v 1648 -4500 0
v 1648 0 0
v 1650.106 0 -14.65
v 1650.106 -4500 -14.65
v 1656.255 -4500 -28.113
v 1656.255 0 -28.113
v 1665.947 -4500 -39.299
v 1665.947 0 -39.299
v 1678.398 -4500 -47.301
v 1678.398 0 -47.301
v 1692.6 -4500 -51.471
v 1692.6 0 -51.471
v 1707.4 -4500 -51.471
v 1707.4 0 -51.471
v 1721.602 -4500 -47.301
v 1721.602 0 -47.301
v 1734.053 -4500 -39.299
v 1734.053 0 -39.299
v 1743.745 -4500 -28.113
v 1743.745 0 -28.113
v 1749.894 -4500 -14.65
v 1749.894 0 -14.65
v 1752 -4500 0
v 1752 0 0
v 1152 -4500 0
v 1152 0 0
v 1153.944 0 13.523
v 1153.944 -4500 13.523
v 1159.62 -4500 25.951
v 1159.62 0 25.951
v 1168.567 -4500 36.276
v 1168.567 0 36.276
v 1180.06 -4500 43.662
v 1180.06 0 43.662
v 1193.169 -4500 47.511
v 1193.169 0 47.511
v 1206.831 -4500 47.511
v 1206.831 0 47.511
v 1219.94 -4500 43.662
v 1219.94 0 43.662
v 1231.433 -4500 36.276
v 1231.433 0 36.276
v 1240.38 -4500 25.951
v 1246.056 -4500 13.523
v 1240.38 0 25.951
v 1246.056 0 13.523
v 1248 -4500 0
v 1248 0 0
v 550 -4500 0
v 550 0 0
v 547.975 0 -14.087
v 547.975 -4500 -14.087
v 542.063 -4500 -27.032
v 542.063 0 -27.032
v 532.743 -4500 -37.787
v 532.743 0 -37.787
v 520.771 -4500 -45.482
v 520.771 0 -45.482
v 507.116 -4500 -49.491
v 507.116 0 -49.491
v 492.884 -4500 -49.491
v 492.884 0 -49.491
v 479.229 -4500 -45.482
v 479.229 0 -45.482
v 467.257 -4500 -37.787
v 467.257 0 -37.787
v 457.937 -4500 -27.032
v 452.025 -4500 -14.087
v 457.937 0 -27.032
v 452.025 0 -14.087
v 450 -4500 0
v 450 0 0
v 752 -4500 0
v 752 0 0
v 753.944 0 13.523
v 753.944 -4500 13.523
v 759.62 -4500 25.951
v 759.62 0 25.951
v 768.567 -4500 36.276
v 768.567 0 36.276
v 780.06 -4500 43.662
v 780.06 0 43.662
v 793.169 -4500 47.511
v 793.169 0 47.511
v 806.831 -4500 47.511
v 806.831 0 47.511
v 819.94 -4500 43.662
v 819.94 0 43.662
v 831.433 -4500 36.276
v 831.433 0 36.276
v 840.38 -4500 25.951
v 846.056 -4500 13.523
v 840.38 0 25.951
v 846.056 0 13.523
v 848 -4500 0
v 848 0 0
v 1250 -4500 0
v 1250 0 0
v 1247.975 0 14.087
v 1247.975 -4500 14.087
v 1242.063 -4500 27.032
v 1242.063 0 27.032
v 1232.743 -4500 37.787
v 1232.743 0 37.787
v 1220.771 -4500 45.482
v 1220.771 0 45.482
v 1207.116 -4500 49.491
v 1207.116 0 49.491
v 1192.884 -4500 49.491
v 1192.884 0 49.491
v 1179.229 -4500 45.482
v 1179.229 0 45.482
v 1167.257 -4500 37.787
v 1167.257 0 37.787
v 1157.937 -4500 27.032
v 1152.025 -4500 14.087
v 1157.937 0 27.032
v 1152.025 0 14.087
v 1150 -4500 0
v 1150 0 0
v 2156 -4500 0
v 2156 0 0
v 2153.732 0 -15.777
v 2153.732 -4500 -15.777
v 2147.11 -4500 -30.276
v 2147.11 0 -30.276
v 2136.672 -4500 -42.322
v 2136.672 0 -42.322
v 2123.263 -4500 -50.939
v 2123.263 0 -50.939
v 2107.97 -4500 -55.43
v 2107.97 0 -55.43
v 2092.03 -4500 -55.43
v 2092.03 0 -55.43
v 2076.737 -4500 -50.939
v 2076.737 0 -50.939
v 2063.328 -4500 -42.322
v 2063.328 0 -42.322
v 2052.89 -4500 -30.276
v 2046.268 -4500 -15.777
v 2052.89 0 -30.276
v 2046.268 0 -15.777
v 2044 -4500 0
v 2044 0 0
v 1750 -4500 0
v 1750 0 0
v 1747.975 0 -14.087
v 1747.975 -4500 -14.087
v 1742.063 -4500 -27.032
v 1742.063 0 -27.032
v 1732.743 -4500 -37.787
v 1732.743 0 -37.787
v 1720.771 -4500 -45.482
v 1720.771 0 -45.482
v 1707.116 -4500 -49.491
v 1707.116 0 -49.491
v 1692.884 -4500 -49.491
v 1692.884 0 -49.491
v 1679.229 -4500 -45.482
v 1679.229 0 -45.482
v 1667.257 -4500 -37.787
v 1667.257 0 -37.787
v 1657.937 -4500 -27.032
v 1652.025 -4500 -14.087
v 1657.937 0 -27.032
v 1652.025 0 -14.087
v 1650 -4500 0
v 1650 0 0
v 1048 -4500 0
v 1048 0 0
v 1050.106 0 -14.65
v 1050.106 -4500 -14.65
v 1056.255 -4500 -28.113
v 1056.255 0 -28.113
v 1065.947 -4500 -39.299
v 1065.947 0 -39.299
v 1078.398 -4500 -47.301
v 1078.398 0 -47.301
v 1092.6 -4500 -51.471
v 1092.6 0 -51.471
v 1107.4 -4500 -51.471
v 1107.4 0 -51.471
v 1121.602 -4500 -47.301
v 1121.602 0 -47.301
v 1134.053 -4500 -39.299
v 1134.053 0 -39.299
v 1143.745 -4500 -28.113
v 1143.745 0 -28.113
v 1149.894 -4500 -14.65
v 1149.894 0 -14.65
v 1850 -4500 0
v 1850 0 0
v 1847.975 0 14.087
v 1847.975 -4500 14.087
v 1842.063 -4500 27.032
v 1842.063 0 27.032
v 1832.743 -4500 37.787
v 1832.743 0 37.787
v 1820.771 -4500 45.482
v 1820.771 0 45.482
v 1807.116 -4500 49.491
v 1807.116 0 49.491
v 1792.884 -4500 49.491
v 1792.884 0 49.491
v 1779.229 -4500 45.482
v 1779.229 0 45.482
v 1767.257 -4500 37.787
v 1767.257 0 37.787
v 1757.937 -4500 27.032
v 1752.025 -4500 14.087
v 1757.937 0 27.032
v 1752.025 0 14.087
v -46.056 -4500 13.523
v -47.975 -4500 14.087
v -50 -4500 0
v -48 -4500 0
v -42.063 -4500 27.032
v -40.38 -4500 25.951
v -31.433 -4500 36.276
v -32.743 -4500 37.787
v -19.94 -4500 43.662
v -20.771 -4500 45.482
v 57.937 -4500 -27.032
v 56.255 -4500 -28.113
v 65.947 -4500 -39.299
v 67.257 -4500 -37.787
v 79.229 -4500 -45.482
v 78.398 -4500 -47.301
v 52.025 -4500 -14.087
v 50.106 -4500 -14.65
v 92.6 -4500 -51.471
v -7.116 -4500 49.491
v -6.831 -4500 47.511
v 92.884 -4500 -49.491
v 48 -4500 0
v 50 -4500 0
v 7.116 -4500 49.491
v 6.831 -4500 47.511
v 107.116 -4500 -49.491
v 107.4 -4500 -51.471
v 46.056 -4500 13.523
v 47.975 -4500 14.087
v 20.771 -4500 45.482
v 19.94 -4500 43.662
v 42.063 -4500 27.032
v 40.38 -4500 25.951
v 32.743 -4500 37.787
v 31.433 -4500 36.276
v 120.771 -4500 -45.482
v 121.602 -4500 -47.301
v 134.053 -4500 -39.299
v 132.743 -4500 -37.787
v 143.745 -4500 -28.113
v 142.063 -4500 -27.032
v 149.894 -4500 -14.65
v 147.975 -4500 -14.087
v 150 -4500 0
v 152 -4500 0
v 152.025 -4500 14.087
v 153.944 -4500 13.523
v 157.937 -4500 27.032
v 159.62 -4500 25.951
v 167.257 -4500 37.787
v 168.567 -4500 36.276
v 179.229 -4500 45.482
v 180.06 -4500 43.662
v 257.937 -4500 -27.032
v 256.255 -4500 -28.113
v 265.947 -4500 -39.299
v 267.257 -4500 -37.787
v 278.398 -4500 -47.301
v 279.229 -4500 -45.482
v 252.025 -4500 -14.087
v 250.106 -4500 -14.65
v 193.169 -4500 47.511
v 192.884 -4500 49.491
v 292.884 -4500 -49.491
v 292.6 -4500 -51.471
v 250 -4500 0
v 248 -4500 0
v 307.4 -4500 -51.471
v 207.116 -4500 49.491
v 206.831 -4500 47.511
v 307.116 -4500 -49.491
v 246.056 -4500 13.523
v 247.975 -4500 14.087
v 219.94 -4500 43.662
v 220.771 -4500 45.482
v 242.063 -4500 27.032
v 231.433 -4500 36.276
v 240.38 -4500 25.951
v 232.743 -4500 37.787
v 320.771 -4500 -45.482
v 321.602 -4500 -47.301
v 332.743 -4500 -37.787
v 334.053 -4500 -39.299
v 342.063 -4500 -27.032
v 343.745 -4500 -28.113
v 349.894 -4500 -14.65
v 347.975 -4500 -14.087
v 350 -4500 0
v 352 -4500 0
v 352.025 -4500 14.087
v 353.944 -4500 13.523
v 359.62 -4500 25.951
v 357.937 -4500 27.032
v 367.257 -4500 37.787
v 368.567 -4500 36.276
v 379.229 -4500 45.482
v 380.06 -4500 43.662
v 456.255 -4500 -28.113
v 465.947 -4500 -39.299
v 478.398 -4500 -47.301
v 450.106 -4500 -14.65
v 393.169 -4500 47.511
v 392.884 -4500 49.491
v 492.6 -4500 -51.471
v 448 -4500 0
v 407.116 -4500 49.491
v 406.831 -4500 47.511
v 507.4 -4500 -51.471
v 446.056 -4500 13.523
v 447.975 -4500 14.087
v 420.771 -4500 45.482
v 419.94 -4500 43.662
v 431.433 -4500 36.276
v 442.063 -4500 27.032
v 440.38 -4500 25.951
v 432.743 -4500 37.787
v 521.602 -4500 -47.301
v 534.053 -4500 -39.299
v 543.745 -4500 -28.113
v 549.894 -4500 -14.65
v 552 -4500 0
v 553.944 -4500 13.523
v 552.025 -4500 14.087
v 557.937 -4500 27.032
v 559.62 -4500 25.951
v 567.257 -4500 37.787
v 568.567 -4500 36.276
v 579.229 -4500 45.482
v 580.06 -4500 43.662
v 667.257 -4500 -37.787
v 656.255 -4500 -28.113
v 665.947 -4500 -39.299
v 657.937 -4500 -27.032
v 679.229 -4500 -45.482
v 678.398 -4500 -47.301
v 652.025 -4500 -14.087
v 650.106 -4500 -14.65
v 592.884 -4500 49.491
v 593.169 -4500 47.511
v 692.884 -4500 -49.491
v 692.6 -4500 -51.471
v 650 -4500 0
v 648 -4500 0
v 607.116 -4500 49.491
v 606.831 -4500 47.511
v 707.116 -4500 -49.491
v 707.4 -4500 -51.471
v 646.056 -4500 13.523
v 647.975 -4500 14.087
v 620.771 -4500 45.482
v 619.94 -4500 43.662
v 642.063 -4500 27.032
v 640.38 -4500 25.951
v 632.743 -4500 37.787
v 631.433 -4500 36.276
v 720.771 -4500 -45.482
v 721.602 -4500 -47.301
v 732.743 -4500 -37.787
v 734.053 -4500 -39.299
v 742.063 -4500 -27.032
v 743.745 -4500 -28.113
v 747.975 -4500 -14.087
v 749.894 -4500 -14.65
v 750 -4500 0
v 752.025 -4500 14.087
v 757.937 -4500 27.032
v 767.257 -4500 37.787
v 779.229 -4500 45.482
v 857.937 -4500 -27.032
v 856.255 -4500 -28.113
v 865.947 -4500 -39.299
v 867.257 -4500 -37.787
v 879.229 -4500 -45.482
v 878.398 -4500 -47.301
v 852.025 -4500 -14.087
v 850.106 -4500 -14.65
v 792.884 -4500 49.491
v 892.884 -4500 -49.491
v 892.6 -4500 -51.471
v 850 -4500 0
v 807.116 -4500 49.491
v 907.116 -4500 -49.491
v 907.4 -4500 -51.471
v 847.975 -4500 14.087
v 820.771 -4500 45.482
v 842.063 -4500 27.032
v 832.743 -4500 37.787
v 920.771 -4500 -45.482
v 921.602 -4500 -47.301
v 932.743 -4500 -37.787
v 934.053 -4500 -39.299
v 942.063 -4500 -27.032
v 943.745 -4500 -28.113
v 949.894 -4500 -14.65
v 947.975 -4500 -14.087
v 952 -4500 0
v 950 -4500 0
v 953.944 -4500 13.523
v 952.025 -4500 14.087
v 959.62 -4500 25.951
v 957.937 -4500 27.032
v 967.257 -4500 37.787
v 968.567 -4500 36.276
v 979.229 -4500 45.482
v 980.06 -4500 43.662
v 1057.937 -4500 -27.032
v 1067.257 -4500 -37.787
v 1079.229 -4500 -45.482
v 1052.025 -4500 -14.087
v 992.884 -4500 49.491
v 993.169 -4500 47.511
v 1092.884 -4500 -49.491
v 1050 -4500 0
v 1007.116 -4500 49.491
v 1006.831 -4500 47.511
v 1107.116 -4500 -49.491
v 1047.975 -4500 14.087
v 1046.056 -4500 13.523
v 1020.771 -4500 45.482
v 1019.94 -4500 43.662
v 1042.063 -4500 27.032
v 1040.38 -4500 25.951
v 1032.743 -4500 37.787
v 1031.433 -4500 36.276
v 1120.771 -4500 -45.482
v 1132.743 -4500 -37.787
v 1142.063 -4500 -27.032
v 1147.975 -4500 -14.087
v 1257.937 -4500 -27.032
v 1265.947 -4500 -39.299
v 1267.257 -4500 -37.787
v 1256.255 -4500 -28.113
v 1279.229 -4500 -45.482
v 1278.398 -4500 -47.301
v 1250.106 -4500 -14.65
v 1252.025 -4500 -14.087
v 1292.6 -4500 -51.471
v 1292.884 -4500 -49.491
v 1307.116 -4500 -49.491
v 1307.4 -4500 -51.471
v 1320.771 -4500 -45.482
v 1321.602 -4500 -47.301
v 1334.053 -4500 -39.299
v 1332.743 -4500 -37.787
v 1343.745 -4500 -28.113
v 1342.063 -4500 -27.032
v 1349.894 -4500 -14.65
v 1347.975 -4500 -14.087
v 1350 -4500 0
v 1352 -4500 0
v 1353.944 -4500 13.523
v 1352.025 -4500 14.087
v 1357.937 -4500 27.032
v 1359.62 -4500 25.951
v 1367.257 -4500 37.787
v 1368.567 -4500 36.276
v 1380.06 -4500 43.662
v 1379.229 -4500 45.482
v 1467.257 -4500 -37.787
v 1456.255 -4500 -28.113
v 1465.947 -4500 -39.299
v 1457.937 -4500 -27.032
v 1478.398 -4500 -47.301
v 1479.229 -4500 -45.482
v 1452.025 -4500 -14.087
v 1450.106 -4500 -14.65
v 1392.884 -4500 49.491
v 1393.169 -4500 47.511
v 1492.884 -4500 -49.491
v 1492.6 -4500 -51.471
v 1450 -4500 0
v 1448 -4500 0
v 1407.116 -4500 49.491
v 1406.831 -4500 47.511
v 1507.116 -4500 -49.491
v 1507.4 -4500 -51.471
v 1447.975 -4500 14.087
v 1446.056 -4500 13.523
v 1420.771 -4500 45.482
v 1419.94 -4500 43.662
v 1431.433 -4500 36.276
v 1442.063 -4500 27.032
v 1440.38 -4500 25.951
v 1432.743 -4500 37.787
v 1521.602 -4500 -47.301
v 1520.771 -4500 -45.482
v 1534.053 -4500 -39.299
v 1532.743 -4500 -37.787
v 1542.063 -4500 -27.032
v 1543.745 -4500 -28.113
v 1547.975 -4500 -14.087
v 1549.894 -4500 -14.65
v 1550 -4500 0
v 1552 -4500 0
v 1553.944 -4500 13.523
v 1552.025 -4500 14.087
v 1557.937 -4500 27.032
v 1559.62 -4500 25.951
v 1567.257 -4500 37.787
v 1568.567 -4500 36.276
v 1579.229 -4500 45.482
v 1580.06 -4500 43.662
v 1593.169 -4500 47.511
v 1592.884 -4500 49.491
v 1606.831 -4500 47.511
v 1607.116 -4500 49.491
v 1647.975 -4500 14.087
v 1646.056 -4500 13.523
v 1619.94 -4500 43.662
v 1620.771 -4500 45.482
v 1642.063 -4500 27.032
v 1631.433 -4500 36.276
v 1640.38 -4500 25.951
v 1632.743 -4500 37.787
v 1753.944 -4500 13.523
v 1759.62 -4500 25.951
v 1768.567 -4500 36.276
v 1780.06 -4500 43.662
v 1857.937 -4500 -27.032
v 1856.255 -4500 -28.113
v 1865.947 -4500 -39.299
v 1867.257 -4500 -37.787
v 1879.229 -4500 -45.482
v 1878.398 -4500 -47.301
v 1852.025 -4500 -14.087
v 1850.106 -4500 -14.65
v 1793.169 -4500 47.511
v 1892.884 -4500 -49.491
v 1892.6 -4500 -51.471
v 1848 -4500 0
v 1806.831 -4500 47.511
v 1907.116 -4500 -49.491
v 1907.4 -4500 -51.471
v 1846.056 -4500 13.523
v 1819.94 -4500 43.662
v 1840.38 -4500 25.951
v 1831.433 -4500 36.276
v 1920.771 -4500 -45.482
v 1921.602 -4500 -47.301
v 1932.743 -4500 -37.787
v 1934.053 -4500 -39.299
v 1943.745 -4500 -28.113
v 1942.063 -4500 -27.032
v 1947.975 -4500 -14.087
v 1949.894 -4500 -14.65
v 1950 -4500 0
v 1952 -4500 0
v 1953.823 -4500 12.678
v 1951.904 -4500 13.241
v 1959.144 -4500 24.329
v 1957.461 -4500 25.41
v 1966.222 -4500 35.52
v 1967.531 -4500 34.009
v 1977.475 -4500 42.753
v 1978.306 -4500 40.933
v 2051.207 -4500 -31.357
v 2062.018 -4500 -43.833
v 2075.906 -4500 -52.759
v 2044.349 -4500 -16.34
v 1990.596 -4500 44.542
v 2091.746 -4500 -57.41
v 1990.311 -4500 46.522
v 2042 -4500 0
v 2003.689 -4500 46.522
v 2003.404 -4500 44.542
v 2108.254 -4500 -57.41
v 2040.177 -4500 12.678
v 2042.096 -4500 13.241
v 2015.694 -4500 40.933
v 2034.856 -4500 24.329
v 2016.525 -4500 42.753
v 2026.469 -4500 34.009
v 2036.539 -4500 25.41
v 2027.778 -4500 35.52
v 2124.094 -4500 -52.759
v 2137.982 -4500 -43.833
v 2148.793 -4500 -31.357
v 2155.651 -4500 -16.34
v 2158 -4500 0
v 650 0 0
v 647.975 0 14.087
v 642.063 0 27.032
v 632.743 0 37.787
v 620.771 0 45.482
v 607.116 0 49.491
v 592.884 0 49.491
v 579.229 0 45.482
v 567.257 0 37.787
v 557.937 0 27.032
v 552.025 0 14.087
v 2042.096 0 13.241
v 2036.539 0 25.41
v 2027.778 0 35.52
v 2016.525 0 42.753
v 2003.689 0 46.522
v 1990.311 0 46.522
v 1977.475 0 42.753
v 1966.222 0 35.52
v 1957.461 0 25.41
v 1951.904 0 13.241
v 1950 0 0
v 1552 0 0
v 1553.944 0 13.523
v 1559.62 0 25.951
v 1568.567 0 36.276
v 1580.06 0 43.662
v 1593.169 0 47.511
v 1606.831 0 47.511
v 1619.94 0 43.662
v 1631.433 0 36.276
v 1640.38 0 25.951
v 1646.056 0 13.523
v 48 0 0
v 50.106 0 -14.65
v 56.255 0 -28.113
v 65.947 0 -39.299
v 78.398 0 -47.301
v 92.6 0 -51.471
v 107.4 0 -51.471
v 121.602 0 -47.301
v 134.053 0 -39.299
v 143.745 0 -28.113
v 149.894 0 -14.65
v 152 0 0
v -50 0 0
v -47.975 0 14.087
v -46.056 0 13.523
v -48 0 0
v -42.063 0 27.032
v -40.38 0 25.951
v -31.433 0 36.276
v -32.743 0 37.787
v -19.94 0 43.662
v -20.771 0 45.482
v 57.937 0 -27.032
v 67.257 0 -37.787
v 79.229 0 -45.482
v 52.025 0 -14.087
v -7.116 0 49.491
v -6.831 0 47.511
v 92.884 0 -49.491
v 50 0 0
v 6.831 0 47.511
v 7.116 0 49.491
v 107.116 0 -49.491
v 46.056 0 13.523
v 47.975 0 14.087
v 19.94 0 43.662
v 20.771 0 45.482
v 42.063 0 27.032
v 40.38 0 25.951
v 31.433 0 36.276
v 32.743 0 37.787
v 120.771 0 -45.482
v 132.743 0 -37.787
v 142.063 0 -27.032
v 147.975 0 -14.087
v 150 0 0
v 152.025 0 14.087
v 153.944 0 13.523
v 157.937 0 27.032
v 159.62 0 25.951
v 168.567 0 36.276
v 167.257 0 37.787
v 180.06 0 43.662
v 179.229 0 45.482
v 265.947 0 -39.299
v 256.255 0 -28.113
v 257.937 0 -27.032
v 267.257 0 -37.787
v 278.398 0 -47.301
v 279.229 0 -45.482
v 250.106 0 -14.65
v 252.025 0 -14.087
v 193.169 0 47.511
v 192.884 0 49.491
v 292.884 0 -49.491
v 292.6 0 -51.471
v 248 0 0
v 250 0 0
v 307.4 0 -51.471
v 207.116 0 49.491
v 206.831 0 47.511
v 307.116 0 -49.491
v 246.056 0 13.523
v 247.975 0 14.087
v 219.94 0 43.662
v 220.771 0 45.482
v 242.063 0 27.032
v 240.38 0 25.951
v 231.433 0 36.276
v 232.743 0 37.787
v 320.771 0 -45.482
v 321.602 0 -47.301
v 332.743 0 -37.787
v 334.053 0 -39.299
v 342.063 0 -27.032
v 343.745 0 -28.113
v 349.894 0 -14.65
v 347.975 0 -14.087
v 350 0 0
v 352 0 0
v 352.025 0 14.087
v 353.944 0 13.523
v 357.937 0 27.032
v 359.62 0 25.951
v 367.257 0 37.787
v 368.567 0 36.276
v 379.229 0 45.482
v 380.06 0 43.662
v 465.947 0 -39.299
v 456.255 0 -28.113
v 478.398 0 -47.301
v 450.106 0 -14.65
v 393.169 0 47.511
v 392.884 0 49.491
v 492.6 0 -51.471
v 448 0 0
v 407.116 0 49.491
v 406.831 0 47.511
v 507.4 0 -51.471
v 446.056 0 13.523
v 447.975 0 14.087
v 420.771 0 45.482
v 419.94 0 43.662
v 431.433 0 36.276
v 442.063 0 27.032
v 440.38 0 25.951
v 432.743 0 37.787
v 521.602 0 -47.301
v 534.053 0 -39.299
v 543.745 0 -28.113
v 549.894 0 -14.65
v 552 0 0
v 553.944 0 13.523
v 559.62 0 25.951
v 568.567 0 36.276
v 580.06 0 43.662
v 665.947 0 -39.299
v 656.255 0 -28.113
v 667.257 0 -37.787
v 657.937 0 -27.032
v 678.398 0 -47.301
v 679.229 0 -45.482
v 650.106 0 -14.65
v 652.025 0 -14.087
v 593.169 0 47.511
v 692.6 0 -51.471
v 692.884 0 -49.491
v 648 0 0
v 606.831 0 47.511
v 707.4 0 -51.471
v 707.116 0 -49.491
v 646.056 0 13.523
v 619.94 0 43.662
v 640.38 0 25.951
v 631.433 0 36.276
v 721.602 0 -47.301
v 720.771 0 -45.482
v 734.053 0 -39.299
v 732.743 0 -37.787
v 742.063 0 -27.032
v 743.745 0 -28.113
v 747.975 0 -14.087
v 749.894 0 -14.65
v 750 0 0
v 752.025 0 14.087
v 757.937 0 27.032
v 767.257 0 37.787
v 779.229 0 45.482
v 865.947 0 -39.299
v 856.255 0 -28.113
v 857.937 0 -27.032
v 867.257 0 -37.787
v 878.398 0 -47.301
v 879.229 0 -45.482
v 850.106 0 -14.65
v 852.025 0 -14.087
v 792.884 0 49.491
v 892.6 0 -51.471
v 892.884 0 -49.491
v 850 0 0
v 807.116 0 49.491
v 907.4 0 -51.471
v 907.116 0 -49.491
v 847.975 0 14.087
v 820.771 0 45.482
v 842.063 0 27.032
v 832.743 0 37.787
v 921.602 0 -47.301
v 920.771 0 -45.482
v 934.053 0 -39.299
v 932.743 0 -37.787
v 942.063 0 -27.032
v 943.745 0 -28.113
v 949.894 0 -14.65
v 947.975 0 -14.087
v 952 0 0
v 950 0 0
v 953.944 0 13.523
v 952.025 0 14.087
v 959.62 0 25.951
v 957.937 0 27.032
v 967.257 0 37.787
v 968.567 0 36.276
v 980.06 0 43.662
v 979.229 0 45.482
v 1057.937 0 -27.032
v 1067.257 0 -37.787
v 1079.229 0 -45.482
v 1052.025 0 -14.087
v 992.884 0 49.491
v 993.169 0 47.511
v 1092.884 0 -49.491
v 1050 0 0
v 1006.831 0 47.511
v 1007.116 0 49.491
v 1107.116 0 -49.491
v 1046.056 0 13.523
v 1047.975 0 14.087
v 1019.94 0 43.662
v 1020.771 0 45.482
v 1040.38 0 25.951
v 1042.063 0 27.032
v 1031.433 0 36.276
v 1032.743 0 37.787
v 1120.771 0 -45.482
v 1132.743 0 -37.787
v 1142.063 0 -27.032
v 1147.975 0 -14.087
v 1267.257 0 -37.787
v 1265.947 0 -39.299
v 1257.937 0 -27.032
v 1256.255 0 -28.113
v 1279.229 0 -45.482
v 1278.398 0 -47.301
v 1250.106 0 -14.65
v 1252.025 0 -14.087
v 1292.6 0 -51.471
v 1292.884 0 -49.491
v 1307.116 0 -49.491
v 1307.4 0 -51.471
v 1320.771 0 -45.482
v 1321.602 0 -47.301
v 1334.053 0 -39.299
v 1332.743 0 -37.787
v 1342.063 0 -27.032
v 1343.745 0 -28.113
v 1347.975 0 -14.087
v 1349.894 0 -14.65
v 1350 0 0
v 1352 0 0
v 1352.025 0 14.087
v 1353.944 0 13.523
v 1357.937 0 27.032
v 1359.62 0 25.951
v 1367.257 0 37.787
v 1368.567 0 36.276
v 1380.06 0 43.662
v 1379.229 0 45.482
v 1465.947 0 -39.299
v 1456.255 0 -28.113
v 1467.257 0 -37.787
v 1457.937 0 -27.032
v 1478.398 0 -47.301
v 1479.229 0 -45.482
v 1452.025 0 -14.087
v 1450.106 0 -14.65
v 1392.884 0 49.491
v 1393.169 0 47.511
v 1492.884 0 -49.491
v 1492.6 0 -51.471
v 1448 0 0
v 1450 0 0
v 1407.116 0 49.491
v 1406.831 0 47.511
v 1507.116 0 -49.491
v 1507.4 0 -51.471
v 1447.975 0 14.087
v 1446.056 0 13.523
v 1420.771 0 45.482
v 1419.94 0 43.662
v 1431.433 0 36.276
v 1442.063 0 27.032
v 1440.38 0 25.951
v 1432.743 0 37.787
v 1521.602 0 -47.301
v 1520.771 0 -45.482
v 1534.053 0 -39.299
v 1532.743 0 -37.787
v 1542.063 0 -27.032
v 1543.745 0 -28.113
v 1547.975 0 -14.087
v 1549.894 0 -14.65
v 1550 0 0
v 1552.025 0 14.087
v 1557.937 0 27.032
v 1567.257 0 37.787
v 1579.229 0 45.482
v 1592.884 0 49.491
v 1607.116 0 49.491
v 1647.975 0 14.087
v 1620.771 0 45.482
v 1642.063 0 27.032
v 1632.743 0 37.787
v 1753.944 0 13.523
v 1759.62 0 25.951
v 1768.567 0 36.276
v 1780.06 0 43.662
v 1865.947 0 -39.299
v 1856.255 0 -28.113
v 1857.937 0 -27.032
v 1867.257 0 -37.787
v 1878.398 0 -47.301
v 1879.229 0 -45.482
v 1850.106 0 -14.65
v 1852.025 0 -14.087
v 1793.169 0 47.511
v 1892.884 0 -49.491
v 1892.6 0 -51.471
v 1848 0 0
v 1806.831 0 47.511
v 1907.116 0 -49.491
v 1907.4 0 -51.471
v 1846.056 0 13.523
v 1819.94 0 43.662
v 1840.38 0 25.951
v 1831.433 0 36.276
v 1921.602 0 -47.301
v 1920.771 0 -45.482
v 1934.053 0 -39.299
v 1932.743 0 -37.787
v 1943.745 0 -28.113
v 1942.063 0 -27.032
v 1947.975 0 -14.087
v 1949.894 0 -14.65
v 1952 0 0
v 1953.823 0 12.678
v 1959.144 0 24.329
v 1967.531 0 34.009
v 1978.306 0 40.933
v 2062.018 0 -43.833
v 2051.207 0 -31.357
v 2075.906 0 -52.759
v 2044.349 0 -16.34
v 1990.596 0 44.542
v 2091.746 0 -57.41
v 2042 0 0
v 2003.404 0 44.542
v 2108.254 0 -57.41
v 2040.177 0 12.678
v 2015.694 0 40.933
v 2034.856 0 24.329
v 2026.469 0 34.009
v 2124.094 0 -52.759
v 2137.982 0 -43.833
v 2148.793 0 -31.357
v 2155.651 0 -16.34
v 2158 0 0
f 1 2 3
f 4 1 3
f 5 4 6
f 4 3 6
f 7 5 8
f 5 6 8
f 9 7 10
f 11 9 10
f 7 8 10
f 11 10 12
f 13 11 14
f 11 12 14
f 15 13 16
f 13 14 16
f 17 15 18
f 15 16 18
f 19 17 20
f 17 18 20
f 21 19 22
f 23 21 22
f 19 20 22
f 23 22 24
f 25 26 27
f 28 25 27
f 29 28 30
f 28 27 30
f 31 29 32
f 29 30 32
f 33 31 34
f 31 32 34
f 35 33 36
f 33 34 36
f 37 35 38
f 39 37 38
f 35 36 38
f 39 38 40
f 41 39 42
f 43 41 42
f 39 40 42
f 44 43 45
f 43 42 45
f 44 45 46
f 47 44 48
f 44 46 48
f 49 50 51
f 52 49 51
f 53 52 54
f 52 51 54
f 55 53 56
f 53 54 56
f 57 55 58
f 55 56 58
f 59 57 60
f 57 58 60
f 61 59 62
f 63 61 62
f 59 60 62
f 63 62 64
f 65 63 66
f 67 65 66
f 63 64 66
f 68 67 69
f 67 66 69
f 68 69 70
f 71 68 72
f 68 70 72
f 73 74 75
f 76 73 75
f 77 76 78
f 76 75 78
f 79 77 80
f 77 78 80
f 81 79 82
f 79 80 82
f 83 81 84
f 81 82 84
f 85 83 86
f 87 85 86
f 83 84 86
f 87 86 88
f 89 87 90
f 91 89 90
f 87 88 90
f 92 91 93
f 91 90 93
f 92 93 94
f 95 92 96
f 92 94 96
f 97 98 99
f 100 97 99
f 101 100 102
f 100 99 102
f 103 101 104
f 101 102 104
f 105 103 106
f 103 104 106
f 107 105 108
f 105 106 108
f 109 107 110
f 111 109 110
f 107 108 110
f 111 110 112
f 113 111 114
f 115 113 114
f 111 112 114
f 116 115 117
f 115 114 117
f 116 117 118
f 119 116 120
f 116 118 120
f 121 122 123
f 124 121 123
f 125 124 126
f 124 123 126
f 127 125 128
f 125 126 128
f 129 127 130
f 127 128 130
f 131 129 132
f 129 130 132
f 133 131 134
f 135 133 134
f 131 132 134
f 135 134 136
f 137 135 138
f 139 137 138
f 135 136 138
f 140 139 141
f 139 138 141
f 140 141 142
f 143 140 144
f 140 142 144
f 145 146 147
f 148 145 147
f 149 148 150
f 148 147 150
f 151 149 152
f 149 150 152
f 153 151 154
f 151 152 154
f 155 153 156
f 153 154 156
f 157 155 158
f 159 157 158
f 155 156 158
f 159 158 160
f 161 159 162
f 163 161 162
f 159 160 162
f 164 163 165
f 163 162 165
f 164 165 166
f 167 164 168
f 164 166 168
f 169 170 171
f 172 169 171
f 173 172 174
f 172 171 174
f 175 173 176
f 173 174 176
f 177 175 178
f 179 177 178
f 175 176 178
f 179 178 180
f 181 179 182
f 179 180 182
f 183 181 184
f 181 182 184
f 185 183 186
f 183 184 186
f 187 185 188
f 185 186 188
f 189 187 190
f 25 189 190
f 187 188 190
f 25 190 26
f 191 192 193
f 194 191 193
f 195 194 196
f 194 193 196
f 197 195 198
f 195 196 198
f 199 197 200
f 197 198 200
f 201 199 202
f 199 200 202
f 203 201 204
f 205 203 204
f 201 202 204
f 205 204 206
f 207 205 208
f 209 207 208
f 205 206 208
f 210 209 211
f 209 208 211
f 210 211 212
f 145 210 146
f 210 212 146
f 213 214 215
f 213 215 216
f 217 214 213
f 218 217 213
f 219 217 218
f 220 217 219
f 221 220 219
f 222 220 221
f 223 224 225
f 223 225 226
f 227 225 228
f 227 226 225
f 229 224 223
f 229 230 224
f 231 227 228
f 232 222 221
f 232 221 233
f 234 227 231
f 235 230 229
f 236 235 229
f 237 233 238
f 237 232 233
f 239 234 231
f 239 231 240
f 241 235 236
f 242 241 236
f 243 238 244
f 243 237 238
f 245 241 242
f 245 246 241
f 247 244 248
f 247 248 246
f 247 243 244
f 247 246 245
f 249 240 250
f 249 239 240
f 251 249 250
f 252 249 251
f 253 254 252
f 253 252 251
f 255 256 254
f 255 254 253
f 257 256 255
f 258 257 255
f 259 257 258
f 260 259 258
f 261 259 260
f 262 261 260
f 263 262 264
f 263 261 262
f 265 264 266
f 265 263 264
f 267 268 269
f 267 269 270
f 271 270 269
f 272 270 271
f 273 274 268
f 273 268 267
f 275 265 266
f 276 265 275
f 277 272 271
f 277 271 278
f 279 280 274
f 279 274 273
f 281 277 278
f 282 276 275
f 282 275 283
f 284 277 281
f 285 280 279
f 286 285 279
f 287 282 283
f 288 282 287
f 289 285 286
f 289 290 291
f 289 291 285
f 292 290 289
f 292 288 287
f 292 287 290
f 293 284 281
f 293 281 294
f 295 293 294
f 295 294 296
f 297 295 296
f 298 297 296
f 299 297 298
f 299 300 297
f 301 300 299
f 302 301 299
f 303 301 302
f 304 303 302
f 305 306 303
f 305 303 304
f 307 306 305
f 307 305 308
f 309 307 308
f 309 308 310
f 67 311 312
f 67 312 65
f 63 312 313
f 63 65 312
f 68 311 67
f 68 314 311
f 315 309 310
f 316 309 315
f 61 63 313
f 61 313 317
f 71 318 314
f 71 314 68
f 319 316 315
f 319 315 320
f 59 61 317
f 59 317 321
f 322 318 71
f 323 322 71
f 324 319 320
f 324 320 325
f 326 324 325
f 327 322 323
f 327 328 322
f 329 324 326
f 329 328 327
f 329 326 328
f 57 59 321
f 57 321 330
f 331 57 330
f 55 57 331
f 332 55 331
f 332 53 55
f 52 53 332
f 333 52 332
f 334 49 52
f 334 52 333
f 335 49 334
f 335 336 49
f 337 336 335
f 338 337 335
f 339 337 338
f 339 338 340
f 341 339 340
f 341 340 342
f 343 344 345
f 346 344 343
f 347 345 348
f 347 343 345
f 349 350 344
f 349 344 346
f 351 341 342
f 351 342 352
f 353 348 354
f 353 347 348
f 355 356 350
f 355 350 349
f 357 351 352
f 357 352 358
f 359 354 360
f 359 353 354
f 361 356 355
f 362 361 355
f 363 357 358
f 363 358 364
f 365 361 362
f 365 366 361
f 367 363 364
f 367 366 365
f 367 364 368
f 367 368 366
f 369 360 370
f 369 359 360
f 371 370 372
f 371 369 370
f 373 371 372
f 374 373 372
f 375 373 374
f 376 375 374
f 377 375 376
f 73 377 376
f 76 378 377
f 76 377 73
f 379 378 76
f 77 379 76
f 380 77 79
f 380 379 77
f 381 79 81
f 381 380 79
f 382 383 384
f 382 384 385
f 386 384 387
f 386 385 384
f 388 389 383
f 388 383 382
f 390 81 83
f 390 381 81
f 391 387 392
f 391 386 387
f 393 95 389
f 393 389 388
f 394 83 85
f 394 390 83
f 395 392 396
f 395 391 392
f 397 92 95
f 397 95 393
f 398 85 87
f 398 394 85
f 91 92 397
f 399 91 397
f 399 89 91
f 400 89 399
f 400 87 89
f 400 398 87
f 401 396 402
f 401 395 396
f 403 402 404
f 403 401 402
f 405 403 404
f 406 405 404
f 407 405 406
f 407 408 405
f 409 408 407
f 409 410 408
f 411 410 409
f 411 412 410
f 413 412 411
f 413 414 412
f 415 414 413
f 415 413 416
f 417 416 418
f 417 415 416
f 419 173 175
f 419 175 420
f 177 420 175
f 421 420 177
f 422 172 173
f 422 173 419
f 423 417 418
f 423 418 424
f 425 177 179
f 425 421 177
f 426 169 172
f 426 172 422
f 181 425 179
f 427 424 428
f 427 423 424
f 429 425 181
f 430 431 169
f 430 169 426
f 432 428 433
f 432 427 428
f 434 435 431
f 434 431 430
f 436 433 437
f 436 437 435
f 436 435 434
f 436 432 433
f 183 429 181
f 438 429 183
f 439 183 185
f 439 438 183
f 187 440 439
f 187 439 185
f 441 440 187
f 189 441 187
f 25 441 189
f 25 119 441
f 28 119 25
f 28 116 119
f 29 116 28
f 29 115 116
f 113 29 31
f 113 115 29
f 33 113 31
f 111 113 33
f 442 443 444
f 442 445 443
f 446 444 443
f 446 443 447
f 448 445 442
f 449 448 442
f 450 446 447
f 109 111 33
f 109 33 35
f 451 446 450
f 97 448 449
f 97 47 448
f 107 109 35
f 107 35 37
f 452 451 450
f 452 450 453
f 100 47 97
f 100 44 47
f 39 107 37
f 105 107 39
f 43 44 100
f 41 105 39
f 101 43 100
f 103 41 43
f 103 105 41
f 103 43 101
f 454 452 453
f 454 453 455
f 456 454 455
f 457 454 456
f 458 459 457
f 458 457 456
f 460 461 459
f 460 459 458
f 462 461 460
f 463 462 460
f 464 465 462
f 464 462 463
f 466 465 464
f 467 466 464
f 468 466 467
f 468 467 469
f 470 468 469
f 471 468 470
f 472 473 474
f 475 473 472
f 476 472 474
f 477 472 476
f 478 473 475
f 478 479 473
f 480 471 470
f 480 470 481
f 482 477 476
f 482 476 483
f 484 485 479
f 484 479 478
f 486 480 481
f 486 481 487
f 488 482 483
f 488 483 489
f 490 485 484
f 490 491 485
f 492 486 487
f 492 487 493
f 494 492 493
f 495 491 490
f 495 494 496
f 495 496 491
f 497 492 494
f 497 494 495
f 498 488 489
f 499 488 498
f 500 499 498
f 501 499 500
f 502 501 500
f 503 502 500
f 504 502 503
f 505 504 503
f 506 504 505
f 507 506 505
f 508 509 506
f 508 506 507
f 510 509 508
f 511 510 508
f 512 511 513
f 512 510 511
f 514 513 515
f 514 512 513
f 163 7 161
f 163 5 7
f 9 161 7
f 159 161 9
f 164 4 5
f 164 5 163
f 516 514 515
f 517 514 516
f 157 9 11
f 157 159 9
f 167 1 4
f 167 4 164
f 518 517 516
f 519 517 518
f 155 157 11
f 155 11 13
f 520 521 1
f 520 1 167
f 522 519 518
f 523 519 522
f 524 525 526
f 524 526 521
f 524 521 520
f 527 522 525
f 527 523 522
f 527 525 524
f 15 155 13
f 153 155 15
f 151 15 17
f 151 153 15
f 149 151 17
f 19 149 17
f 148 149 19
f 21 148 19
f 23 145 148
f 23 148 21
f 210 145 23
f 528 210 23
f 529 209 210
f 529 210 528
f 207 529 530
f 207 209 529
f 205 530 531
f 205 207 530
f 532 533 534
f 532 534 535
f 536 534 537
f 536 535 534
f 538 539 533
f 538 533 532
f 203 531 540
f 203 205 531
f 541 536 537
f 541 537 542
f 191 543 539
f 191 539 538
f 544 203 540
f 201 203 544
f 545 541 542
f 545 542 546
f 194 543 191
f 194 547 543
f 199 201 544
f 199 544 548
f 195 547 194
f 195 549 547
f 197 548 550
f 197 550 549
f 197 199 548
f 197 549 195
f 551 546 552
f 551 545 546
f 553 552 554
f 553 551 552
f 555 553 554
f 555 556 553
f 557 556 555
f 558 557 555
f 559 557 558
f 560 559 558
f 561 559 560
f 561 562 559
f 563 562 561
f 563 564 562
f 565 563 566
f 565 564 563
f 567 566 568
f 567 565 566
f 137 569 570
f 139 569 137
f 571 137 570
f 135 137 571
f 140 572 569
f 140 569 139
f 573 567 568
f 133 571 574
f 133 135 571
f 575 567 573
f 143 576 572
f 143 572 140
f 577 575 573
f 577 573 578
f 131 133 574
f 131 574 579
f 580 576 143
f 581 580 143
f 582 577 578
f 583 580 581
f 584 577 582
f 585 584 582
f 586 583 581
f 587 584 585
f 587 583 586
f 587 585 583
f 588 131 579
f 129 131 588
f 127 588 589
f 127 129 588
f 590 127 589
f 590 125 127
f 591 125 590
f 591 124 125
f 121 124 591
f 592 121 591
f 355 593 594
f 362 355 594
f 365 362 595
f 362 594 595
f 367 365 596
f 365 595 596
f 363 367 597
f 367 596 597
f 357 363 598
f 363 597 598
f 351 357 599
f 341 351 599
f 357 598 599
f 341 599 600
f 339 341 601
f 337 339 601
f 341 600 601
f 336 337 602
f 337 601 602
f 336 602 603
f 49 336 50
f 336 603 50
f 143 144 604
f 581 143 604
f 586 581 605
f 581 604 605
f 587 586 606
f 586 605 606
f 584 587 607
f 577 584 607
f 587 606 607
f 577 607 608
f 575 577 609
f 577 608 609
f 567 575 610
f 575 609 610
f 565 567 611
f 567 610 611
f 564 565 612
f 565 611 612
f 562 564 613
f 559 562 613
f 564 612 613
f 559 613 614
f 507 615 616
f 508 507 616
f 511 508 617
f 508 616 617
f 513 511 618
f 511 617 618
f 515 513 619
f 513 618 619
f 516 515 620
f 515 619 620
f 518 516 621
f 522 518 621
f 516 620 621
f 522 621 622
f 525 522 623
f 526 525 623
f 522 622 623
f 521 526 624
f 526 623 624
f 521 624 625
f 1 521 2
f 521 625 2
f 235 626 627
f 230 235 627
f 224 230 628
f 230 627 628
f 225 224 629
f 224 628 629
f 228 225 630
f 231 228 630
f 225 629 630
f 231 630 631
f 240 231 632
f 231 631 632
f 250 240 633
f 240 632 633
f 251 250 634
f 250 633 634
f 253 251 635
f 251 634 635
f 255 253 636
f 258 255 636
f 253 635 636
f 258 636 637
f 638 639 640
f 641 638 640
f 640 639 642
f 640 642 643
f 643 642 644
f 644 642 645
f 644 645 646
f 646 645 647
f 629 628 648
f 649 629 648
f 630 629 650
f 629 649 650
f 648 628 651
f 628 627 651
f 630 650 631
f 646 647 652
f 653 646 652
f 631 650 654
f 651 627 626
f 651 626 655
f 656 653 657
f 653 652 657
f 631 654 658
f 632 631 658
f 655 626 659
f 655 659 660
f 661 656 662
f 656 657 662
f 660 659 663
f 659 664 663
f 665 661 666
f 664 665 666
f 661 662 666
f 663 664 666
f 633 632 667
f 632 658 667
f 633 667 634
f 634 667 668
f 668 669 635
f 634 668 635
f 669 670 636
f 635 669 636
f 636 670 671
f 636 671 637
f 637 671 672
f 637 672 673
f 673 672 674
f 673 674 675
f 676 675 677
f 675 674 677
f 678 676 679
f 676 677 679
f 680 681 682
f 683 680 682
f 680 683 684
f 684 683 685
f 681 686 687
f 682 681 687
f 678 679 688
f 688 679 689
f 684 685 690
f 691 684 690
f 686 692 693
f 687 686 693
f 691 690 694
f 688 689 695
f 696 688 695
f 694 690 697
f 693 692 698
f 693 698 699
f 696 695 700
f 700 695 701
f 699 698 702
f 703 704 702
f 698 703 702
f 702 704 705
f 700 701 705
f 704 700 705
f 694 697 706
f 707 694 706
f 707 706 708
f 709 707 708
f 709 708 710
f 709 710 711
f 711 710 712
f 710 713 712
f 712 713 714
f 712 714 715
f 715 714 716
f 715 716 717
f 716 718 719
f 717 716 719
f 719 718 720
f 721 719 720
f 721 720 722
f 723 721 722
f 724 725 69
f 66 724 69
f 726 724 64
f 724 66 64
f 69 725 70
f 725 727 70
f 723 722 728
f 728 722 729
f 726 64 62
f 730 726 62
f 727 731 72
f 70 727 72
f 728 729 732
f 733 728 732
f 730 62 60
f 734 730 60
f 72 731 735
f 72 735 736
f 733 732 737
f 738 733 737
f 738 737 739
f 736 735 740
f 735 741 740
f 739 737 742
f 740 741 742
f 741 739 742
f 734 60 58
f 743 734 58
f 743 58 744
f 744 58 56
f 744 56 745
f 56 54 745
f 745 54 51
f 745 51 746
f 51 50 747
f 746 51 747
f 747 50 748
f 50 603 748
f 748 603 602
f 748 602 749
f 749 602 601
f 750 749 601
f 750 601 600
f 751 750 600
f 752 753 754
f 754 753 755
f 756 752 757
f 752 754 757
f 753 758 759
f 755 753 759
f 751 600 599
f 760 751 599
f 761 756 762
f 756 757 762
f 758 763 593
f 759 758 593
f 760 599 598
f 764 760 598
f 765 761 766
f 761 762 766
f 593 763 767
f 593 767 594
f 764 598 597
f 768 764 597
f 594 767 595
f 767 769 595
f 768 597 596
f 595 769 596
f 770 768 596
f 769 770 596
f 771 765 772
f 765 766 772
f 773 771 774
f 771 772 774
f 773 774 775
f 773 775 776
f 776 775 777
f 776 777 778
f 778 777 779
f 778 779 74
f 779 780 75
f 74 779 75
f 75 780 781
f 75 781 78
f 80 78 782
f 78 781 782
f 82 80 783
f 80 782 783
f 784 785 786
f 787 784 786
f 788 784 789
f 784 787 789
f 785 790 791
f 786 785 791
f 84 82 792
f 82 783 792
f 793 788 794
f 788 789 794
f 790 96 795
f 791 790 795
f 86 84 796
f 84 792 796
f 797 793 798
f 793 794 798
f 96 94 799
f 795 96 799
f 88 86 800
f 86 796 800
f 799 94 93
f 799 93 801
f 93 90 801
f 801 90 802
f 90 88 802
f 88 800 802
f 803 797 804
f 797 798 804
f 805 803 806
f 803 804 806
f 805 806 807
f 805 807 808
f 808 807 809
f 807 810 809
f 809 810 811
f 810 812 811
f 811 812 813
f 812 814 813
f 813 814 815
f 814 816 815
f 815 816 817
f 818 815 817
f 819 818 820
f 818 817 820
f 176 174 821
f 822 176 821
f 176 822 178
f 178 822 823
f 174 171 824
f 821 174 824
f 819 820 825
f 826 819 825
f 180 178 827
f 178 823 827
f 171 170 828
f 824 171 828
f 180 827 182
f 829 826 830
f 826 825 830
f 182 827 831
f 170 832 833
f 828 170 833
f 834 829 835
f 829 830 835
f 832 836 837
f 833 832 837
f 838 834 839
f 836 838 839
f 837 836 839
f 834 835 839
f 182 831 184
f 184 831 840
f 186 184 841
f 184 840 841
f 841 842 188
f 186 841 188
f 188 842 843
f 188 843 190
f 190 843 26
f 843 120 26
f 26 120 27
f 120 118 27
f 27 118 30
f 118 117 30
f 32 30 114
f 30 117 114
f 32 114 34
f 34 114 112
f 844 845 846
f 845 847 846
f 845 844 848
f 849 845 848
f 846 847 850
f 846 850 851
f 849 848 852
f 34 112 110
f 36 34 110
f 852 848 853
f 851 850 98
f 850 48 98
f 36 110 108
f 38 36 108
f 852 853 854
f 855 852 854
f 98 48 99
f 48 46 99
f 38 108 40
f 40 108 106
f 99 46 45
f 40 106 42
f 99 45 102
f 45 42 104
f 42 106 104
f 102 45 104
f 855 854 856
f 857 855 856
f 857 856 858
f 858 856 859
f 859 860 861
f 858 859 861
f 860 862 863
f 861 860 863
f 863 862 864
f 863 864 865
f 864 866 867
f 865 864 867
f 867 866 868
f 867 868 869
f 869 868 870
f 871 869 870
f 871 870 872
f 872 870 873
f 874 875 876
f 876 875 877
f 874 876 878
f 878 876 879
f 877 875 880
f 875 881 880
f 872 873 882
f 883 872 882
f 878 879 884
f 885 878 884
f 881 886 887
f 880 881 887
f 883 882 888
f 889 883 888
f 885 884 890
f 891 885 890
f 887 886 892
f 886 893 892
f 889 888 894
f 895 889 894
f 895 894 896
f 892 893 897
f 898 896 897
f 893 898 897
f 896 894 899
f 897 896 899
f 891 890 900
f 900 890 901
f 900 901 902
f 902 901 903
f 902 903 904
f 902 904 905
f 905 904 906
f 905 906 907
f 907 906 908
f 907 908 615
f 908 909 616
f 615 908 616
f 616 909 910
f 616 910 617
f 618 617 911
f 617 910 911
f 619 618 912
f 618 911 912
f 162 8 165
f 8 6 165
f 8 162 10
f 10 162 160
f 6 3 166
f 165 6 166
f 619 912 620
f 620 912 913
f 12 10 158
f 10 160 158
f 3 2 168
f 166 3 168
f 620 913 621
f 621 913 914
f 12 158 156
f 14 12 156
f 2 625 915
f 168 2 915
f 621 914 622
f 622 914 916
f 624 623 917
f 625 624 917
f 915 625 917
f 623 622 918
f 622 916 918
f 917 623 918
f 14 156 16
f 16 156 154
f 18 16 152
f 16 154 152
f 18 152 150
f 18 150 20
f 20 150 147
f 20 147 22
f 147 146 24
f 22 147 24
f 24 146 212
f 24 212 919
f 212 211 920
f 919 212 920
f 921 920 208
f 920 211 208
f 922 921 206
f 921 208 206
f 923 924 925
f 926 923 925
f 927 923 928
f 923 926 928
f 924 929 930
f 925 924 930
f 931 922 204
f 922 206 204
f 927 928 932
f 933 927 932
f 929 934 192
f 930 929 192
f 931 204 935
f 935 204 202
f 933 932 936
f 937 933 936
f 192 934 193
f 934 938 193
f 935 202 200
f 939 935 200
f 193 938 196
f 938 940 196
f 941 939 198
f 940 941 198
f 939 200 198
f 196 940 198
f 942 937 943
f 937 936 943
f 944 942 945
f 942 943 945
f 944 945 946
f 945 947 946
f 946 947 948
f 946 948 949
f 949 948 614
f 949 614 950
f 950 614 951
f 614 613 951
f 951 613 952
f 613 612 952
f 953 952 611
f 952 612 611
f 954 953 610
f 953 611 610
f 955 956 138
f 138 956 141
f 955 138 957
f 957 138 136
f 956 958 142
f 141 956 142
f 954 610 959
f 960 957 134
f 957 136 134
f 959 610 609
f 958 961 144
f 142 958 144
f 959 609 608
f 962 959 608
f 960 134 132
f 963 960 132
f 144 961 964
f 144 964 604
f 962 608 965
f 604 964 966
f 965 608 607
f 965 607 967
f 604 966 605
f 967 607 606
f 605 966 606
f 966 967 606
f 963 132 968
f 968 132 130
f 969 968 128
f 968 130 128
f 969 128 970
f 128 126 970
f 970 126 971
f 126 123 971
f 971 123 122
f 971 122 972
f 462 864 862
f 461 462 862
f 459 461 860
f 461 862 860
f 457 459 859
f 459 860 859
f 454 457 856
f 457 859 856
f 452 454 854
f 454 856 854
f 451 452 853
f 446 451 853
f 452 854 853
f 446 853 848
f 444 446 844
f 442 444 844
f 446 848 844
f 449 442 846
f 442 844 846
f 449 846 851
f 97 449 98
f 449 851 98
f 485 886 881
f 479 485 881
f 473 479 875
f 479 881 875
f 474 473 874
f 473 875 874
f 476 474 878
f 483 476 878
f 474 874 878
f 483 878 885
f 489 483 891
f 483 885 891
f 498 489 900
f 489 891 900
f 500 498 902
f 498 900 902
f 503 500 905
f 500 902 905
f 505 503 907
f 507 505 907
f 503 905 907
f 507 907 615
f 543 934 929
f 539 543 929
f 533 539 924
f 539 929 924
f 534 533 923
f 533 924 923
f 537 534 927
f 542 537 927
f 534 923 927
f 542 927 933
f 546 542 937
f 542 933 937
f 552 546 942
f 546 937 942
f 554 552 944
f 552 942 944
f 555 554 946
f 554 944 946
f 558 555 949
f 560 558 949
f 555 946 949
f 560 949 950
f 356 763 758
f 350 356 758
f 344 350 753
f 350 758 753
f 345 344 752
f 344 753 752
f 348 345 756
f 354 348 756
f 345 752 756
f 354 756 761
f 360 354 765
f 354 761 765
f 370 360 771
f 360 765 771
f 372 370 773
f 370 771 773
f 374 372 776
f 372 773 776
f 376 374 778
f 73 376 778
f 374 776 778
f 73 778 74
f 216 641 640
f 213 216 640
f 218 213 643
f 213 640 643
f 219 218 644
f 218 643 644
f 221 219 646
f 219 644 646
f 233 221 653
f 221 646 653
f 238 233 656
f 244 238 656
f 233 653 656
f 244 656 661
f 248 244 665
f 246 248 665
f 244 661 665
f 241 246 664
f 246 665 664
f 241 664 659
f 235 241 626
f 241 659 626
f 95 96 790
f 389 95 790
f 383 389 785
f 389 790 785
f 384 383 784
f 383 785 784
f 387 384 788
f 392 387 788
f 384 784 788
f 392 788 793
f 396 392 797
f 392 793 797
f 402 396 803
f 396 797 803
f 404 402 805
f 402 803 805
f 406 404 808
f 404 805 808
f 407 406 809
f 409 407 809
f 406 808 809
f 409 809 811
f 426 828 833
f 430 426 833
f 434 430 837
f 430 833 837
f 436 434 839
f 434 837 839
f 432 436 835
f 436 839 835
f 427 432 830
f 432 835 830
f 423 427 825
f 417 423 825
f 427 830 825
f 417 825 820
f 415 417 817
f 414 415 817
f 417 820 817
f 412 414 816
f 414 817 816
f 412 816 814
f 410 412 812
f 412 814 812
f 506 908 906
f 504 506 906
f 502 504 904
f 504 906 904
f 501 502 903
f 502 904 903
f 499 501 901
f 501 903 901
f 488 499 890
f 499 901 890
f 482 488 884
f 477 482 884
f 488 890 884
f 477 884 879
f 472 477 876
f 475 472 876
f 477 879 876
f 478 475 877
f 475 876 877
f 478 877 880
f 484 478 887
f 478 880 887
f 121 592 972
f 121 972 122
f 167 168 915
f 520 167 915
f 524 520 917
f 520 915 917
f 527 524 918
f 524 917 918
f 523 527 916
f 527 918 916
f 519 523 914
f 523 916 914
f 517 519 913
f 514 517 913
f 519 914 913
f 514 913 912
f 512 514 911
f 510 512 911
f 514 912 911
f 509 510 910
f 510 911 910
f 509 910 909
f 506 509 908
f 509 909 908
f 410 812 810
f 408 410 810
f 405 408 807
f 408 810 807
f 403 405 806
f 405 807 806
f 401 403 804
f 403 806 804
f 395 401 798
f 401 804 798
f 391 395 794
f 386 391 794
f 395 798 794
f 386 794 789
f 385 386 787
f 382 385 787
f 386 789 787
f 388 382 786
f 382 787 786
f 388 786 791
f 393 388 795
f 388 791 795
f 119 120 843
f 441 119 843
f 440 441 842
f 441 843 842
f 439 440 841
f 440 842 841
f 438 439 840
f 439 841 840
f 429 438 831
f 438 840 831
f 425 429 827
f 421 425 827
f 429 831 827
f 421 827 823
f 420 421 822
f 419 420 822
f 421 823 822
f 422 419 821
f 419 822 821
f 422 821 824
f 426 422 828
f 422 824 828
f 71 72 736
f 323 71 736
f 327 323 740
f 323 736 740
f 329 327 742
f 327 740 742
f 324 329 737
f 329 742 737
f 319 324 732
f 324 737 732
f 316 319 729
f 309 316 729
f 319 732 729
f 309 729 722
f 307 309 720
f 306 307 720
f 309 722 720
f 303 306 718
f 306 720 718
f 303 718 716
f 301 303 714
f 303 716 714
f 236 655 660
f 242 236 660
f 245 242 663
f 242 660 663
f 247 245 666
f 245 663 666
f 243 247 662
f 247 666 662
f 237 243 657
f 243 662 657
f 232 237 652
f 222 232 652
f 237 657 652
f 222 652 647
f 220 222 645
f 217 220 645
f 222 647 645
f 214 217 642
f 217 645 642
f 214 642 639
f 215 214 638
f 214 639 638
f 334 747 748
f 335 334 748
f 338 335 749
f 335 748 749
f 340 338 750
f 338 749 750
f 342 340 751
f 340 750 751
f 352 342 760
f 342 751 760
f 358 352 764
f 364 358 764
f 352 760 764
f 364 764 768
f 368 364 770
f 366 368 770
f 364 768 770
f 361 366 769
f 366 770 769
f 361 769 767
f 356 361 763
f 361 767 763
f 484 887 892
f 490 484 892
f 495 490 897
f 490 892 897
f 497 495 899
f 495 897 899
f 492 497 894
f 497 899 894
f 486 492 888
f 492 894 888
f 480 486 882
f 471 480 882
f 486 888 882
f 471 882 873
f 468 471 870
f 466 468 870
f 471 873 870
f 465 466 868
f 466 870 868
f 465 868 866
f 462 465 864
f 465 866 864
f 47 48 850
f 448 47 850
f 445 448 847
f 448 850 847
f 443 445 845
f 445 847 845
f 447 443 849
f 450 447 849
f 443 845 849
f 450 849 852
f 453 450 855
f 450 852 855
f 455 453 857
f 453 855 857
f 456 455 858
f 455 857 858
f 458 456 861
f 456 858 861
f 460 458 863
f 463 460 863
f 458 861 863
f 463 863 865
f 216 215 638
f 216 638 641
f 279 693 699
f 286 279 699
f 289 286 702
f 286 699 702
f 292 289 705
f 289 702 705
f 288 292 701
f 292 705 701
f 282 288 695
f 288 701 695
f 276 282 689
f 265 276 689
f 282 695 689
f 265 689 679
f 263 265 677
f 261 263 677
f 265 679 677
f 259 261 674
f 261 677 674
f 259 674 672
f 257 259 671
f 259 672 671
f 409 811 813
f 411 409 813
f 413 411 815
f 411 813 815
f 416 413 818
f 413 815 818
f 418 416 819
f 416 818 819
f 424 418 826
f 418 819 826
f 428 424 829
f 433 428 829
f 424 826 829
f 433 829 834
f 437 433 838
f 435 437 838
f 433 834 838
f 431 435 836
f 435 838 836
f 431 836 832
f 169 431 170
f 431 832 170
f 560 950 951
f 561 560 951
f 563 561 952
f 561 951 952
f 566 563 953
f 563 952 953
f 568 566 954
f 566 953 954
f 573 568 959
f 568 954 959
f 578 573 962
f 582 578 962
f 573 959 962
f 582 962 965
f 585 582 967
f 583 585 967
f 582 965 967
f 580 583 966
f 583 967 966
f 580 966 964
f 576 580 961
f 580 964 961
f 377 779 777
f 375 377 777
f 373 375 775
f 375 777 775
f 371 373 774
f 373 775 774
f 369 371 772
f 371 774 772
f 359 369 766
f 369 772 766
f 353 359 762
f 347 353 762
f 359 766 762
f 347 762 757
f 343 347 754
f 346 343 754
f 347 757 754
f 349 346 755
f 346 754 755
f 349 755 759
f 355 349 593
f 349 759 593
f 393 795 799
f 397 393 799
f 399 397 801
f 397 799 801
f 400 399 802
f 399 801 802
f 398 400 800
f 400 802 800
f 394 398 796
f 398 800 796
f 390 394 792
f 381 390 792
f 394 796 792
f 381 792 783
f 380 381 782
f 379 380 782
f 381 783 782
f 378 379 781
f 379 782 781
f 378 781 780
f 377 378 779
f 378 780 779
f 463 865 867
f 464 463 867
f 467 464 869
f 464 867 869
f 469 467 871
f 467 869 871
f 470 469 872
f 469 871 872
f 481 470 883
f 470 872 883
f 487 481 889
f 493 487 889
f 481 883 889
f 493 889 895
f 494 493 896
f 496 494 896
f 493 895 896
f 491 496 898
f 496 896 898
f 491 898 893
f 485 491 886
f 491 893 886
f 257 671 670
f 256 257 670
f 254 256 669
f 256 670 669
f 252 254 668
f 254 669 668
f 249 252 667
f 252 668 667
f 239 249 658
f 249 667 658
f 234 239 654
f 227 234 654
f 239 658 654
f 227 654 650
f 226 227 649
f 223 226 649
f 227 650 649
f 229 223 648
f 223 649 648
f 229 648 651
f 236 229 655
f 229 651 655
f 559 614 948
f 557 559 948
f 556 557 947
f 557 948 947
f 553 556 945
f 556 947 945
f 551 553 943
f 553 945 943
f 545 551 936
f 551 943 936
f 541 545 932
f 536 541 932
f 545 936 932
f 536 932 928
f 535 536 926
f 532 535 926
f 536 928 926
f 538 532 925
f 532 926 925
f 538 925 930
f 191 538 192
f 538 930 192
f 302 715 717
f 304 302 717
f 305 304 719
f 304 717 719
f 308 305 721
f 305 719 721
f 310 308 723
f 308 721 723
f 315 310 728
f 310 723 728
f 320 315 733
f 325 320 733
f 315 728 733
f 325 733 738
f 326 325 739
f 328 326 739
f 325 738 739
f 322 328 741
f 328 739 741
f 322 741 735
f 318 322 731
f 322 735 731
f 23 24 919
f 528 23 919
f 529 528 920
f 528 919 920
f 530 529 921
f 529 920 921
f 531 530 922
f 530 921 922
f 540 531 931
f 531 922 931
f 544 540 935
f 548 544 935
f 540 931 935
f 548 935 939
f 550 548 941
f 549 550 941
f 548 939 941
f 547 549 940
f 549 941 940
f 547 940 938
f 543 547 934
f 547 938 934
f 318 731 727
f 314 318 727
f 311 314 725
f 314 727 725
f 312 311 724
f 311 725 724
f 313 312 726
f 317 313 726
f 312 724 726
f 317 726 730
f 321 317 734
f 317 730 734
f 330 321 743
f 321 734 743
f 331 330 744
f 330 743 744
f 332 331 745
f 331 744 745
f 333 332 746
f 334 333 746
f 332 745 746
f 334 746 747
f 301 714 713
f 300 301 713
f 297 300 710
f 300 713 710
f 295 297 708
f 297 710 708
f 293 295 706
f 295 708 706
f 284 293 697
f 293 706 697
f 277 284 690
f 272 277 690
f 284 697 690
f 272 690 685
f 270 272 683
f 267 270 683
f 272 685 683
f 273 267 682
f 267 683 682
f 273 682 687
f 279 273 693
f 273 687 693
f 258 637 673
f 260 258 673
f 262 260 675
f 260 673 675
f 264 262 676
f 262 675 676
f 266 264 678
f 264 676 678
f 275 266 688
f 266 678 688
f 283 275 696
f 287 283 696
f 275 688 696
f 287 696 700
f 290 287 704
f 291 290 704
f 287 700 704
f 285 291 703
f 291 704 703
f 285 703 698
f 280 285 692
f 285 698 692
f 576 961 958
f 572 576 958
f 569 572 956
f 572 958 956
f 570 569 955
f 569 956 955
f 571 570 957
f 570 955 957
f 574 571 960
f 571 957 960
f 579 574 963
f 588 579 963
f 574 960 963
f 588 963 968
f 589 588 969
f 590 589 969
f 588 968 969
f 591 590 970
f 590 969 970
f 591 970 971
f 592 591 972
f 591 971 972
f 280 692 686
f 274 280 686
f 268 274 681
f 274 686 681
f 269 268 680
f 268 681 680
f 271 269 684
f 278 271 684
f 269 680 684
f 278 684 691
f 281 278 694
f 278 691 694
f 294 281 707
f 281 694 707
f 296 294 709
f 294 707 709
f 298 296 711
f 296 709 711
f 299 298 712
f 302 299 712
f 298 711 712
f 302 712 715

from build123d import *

# Parameters (mm, degrees)
F1_DEPTH = 4500


with BuildPart() as f1:
    # F0 (on Front) → F1 (new body)
    with BuildSketch(Plane.XZ):
        with BuildLine():
            ThreePointArc((150, 0), (100, -50), (50, 0))
            ThreePointArc((50, 0), (0, 50), (-50, 0))
            Line((-50, 0), (-48, 0))
            ThreePointArc((-48, 0), (0, 48), (48, 0))
            ThreePointArc((48, 0), (100, -52), (152, 0))
            ThreePointArc((152, 0), (200, 48), (248, 0))
            ThreePointArc((248, 0), (300, -52), (352, 0))
            ThreePointArc((352, 0), (400, 48), (448, 0))
            ThreePointArc((448, 0), (500, -52), (552, 0))
            ThreePointArc((552, 0), (600, 48), (648, 0))
            ThreePointArc((648, 0), (700, -52), (752, 0))
            ThreePointArc((752, 0), (800, 48), (848, 0))
            ThreePointArc((848, 0), (900, -52), (952, 0))
            ThreePointArc((952, 0), (1000, 48), (1048, 0))
            ThreePointArc((1048, 0), (1100, -52), (1152, 0))
            ThreePointArc((1152, 0), (1200, 48), (1248, 0))
            ThreePointArc((1248, 0), (1300, -52), (1352, 0))
            ThreePointArc((1352, 0), (1400, 48), (1448, 0))
            ThreePointArc((1448, 0), (1500, -52), (1552, 0))
            ThreePointArc((1552, 0), (1600, 48), (1648, 0))
            ThreePointArc((1648, 0), (1700, -52), (1752, 0))
            ThreePointArc((1752, 0), (1800, 48), (1848, 0))
            ThreePointArc((1848, 0), (1900, -52), (1952, 0))
            ThreePointArc((1952, 0), (1997, 45), (2042, 0))
            ThreePointArc((2042, 0), (2100, -58), (2158, 0))
            Line((2158, 0), (2156, 0))
            ThreePointArc((2156, 0), (2100, -56), (2044, 0))
            ThreePointArc((2044, 0), (1997, 47), (1950, 0))
            ThreePointArc((1950, 0), (1900, -50), (1850, 0))
            ThreePointArc((1850, 0), (1800, 50), (1750, 0))
            ThreePointArc((1750, 0), (1700, -50), (1650, 0))
            ThreePointArc((1650, 0), (1600, 50), (1550, 0))
            ThreePointArc((1550, 0), (1500, -50), (1450, 0))
            ThreePointArc((1450, 0), (1400, 50), (1350, 0))
            ThreePointArc((1350, 0), (1300, -50), (1250, 0))
            ThreePointArc((1250, 0), (1200, 50), (1150, 0))
            ThreePointArc((1150, 0), (1100, -50), (1050, 0))
            ThreePointArc((1050, 0), (1000, 50), (950, 0))
            ThreePointArc((950, 0), (900, -50), (850, 0))
            ThreePointArc((850, 0), (800, 50), (750, 0))
            ThreePointArc((750, 0), (700, -50), (650, 0))
            ThreePointArc((650, 0), (600, 50), (550, 0))
            ThreePointArc((550, 0), (500, -50), (450, 0))
            ThreePointArc((450, 0), (400, 50), (350, 0))
            ThreePointArc((350, 0), (300, -50), (250, 0))
            ThreePointArc((250, 0), (200, 50), (150, 0))
        make_face()
    extrude(amount=F1_DEPTH)


solid = f1.part
